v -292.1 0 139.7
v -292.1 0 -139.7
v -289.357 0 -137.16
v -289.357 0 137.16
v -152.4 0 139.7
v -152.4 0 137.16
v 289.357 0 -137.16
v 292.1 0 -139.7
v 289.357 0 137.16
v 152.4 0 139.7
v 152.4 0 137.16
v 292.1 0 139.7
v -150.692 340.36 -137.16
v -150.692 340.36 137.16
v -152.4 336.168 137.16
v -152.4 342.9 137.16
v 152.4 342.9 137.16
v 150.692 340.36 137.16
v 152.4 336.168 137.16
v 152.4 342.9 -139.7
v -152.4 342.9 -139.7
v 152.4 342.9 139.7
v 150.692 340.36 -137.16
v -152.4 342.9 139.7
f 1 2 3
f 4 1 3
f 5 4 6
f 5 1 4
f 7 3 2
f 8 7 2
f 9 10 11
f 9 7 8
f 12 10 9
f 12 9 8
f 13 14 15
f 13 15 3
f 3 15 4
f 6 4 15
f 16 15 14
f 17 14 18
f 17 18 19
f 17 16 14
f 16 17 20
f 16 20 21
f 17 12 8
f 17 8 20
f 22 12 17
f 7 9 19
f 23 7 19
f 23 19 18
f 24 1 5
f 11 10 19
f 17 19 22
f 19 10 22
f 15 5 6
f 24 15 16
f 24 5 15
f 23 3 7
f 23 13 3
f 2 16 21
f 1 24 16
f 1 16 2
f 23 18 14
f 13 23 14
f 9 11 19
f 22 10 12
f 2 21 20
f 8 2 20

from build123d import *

# Parameters (mm, degrees)
F1_DEPTH = 139.7
F2_T     = -2.54
F3_W     = 304.8
F3_H     = 342.9
F4_DEPTH = 2.54


with BuildPart() as f1:
    # F0 (on Top) → F1 (new body, symmetric)
    with BuildSketch(Plane.XY):
        Polygon((-152.4, 342.9), (-292.1, 0), (292.1, 0), (152.4, 342.9), align=None)
    extrude(amount=F1_DEPTH, both=True)

    # F2
    f2_openings = [f1.faces().sort_by_distance(p)[0] for p in [
        (0, 0, 0),
    ]]
    offset(amount=F2_T, openings=f2_openings)

    # F3 (on face) → F4 (cut, through all)
    with BuildSketch(Plane.XY.offset(139.7)):
        with Locations((0, 171.45)):
            Rectangle(F3_W, F3_H)
    extrude(amount=-F4_DEPTH, mode=Mode.SUBTRACT)


solid = f1.part
